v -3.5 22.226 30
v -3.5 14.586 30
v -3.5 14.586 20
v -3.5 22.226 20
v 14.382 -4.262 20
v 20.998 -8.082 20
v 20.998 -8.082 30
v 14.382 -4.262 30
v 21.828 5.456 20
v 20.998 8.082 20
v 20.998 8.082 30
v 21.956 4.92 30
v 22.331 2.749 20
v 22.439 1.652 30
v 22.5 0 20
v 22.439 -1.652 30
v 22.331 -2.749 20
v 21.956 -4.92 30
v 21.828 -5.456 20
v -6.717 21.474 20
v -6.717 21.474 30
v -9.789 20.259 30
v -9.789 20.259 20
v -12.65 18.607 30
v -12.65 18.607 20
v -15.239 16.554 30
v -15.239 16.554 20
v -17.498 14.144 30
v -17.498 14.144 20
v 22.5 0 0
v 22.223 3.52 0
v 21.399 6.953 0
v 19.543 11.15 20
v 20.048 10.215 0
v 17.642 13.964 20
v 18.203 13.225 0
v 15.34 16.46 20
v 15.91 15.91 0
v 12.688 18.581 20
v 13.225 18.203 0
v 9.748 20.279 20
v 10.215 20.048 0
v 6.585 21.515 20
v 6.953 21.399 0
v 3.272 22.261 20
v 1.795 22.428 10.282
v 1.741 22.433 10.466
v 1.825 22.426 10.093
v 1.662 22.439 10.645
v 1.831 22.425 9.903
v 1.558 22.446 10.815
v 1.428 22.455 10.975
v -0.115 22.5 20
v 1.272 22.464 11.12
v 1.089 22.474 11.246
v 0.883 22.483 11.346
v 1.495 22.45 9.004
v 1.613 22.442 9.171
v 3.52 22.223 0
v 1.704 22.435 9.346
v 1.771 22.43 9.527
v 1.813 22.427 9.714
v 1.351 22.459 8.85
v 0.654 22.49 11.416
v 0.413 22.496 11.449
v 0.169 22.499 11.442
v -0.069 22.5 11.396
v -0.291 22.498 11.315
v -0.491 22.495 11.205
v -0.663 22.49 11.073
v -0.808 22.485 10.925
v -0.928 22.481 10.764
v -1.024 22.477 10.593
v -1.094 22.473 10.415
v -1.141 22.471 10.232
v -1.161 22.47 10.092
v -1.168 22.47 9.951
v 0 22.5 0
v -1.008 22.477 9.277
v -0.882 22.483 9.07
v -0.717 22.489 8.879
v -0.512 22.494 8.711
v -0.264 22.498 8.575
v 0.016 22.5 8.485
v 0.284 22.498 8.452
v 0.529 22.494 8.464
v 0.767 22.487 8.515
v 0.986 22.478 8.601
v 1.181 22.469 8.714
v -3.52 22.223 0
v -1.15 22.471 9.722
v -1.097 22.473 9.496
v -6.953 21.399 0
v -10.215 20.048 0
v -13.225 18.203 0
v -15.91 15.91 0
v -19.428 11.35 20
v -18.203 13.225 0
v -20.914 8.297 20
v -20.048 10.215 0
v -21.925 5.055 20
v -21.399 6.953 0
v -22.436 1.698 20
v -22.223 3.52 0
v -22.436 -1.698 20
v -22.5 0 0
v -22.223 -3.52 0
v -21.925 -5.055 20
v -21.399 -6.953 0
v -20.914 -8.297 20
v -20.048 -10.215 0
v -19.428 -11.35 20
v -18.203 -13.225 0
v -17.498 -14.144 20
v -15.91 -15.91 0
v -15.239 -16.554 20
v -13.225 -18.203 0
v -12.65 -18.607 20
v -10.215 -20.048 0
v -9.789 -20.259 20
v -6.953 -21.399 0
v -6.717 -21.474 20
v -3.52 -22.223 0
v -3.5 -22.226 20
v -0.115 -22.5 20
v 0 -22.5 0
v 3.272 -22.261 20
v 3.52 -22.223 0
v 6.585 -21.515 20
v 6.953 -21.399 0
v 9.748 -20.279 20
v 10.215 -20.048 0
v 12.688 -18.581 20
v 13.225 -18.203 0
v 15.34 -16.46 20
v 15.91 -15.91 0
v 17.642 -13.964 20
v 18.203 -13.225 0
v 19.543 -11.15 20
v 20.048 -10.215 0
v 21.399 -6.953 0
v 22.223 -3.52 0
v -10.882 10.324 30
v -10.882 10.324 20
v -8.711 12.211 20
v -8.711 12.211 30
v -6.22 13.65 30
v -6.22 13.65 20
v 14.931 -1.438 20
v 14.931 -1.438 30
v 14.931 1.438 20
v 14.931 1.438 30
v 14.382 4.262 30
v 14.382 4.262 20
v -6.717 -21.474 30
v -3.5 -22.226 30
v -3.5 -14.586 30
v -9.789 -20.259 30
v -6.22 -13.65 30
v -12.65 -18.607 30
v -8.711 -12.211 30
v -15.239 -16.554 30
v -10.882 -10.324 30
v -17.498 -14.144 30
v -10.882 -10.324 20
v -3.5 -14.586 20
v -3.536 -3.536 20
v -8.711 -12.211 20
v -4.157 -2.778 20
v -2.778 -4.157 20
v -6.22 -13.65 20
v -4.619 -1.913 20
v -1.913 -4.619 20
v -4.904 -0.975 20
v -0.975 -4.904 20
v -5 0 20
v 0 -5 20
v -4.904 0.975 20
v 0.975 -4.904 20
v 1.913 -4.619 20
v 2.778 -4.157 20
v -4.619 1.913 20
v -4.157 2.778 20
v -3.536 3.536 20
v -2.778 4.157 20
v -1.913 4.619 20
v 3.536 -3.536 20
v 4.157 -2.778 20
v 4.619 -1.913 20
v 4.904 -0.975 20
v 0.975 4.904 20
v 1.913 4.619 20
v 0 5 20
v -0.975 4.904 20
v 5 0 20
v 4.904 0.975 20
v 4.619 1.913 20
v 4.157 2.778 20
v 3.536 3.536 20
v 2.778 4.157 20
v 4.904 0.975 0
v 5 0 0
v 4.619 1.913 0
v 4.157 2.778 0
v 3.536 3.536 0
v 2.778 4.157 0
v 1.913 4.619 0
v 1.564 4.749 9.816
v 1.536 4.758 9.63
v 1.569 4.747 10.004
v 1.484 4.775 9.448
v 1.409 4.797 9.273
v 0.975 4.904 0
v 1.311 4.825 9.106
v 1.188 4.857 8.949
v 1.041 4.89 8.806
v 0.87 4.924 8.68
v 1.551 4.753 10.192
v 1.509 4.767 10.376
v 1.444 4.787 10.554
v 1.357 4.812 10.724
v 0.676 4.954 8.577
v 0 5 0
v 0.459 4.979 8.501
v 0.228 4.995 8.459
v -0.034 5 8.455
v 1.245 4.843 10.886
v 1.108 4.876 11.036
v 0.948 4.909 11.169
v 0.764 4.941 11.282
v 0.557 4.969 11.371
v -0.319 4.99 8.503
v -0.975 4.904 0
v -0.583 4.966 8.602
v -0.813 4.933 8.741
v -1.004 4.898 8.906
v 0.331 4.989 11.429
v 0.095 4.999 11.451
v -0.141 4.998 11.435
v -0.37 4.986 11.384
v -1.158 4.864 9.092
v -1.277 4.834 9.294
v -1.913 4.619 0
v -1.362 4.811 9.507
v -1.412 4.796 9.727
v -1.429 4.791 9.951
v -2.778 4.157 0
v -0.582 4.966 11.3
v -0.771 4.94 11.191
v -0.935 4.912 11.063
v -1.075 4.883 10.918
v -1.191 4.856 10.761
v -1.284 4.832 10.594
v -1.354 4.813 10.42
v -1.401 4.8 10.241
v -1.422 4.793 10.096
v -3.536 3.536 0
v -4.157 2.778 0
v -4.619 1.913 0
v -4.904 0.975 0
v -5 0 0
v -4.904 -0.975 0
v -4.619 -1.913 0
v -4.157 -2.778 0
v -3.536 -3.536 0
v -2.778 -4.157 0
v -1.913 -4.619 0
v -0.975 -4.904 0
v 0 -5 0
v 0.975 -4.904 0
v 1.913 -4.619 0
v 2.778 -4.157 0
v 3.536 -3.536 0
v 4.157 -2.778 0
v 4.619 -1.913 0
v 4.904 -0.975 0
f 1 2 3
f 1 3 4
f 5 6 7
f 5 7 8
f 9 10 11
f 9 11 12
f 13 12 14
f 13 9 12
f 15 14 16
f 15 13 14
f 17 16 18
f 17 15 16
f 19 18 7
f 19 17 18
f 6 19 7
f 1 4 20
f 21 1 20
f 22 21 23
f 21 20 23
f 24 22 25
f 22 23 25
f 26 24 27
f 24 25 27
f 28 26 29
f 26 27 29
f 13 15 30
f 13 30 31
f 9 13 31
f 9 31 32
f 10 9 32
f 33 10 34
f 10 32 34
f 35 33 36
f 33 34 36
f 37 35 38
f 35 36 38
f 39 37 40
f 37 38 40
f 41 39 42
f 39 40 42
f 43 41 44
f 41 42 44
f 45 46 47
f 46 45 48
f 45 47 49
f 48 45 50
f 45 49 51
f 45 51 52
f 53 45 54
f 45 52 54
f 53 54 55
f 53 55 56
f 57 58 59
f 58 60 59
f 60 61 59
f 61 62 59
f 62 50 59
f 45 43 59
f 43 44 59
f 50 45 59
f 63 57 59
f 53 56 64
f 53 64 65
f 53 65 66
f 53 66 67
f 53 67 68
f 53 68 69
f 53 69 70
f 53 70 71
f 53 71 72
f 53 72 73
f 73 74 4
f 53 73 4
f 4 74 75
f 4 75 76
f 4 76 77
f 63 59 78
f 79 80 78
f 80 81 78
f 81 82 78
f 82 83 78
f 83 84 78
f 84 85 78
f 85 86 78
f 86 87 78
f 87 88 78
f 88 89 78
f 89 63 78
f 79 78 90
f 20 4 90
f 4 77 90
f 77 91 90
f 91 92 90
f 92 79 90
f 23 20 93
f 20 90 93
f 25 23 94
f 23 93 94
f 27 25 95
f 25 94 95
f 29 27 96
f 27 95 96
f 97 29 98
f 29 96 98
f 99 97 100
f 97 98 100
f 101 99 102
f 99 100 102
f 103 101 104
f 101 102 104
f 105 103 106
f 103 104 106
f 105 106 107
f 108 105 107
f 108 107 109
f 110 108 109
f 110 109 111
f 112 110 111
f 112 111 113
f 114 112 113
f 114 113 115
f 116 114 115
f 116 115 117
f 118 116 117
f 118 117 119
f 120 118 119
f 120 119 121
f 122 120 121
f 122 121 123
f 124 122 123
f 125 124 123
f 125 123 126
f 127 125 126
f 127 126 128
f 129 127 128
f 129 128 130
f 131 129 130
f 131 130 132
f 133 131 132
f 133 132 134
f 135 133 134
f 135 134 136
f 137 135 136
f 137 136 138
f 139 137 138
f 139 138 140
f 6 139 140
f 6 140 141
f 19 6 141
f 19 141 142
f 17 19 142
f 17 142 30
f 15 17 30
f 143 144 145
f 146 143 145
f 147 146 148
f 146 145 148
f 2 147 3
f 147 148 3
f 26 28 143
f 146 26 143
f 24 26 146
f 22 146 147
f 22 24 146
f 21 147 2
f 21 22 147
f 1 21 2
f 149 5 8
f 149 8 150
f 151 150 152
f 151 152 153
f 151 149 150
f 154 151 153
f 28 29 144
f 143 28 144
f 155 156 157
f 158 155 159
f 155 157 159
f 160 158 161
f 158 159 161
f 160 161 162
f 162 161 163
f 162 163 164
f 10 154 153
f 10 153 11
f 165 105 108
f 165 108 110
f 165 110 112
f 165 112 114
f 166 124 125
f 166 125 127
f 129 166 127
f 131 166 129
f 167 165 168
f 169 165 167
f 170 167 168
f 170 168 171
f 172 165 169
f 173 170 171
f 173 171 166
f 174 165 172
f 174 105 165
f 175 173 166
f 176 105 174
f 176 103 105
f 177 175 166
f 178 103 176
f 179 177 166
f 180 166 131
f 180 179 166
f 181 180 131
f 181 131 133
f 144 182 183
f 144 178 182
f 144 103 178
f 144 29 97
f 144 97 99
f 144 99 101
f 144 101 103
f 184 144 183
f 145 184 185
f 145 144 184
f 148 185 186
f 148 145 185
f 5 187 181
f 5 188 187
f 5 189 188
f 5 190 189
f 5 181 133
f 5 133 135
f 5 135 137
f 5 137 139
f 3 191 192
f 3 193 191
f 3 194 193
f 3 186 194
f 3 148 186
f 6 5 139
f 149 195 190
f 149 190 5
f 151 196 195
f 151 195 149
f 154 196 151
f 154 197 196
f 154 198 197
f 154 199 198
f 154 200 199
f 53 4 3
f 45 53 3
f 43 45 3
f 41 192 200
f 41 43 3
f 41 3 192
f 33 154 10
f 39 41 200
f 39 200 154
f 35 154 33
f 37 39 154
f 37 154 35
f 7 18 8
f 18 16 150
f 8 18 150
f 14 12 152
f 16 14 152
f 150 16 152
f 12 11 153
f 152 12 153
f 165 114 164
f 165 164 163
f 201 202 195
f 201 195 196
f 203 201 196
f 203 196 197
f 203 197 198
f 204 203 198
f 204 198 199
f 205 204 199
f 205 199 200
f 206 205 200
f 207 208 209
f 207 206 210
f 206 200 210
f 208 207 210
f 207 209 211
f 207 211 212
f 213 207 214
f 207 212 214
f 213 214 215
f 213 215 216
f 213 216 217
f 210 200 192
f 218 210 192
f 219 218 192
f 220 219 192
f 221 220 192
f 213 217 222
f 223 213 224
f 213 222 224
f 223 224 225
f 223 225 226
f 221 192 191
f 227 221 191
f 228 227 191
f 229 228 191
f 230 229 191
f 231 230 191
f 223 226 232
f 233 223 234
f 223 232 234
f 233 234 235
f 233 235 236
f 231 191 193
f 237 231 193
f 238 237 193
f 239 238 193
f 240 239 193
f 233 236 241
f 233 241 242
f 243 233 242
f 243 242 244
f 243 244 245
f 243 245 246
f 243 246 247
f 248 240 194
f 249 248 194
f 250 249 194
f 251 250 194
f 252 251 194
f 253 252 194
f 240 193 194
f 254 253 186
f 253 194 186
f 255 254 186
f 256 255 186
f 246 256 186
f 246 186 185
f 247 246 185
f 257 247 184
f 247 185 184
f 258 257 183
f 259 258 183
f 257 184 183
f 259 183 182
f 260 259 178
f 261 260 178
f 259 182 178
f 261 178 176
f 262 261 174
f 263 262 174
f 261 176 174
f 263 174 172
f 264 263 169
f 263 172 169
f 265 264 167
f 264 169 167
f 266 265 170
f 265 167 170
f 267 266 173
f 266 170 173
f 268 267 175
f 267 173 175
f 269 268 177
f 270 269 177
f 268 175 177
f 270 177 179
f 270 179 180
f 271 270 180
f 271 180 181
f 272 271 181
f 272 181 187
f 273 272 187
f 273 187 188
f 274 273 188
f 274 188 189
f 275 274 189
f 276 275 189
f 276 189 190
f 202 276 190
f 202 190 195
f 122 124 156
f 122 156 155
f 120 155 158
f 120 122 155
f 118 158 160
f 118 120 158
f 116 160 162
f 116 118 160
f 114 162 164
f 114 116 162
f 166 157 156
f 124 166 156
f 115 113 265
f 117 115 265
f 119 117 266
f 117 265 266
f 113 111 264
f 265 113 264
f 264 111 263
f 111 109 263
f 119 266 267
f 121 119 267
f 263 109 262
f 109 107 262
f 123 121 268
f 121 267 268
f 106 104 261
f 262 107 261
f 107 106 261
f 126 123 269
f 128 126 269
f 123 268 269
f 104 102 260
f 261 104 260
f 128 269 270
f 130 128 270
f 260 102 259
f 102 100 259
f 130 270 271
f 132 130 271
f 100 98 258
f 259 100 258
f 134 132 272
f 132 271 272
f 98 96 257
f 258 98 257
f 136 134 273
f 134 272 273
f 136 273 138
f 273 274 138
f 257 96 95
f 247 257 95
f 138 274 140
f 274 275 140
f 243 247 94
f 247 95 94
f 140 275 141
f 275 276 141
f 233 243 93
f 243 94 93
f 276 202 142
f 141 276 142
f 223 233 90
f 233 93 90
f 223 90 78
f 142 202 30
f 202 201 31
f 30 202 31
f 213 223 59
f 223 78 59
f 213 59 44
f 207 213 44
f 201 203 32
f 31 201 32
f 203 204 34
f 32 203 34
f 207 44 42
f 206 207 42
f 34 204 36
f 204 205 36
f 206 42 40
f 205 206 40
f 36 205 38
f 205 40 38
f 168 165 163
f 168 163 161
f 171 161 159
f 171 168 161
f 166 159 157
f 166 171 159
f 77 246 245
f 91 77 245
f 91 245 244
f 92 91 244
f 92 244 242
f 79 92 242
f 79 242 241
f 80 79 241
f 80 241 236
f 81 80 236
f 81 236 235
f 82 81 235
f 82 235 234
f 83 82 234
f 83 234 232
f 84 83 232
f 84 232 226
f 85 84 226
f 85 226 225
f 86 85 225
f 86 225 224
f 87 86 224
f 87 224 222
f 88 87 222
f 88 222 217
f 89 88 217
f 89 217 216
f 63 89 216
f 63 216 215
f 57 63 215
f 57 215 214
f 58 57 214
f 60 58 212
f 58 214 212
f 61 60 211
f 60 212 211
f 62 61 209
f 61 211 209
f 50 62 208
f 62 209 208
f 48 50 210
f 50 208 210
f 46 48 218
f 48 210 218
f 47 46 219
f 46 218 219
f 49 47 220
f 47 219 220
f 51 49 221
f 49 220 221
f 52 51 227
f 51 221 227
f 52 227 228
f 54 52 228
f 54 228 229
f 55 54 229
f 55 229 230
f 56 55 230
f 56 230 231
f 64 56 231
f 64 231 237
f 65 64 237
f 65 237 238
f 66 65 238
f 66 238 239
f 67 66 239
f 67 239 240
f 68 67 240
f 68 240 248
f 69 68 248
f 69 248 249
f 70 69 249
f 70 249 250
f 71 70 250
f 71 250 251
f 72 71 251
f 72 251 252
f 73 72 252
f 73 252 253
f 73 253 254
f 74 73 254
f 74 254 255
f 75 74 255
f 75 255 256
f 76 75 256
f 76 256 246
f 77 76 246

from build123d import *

# Parameters (mm, degrees)
SKETCH1_R                 = 22.5
BOSS_EXTRUDE1_DEPTH       = 20
CUT_EXTRUDE1_REACH        = 22
SKETCH3_R                 = 5
F_3_0MM_DOWEL_HOLE1_D     = 3
F_3_0MM_DOWEL_HOLE1_DEPTH = 22
F_3_0MM_DOWEL_HOLE1_TIP   = 0.901291
BOSS_EXTRUDE3_DEPTH       = 10


with BuildPart() as part:
    # Sketch1 → Boss-Extrude1 (new body)
    with BuildSketch(Plane.XY):
        Circle(SKETCH1_R)
    extrude(amount=BOSS_EXTRUDE1_DEPTH)

    # Sketch3 → Cut-Extrude1 (cut, up to next)
    with BuildSketch(Plane.XY.offset(20), mode=Mode.PRIVATE) as cut_extrude1_sk1:
        Circle(SKETCH3_R)
    cut_extrude1_tool1 = extrude(cut_extrude1_sk1.sketch, amount=-CUT_EXTRUDE1_REACH, mode=Mode.PRIVATE) & part.part
    add(cut_extrude1_tool1.solids().sort_by_distance((0, 0, 20))[0], mode=Mode.SUBTRACT)

    # Ø3.0mm Dowel Hole1
    with Locations(Plane(origin=(0.332625, 22.497541, 9.950984), x_dir=(0.999891, -0.014783, 0), z_dir=(0.014783, 0.999891, 0))):
        with Locations((0, 0)):
            Hole(F_3_0MM_DOWEL_HOLE1_D / 2, depth=F_3_0MM_DOWEL_HOLE1_DEPTH)
            with Locations((0, 0, -(F_3_0MM_DOWEL_HOLE1_DEPTH + F_3_0MM_DOWEL_HOLE1_TIP / 2))):  # 118° drill point
                Cone(0, F_3_0MM_DOWEL_HOLE1_D / 2, F_3_0MM_DOWEL_HOLE1_TIP, mode=Mode.SUBTRACT)

    # Sketch6 → Boss-Extrude3 (add)
    with BuildSketch(Plane.XY.offset(20)):
        with BuildLine():
            Line((-17.498377, 14.144144), (-10.881805, 10.324065))
            ThreePointArc((-10.881805, 10.324065), (-7.5, 12.990381), (-3.5, 14.585952))
            Line((-3.5, 14.585952), (-3.5, 22.226111))
            ThreePointArc((-3.5, 22.226111), (-11.25, 19.485572), (-17.498377, 14.144144))
        make_face()
        with BuildLine():
            Line((14.381805, 4.261887), (20.998377, 8.081966))
            ThreePointArc((20.998377, 8.081966), (22.5, 0), (20.998377, -8.081966))
            Line((20.998377, -8.081966), (14.381805, -4.261887))
            ThreePointArc((14.381805, -4.261887), (15, 0), (14.381805, 4.261887))
        make_face()
        with BuildLine():
            Line((-3.5, -14.585952), (-3.5, -22.226111))
            ThreePointArc((-3.5, -22.226111), (-11.25, -19.485572), (-17.498377, -14.144144))
            Line((-17.498377, -14.144144), (-10.881805, -10.324065))
            ThreePointArc((-10.881805, -10.324065), (-7.5, -12.990381), (-3.5, -14.585952))
        make_face()
    extrude(amount=BOSS_EXTRUDE3_DEPTH)


solid = part.part
